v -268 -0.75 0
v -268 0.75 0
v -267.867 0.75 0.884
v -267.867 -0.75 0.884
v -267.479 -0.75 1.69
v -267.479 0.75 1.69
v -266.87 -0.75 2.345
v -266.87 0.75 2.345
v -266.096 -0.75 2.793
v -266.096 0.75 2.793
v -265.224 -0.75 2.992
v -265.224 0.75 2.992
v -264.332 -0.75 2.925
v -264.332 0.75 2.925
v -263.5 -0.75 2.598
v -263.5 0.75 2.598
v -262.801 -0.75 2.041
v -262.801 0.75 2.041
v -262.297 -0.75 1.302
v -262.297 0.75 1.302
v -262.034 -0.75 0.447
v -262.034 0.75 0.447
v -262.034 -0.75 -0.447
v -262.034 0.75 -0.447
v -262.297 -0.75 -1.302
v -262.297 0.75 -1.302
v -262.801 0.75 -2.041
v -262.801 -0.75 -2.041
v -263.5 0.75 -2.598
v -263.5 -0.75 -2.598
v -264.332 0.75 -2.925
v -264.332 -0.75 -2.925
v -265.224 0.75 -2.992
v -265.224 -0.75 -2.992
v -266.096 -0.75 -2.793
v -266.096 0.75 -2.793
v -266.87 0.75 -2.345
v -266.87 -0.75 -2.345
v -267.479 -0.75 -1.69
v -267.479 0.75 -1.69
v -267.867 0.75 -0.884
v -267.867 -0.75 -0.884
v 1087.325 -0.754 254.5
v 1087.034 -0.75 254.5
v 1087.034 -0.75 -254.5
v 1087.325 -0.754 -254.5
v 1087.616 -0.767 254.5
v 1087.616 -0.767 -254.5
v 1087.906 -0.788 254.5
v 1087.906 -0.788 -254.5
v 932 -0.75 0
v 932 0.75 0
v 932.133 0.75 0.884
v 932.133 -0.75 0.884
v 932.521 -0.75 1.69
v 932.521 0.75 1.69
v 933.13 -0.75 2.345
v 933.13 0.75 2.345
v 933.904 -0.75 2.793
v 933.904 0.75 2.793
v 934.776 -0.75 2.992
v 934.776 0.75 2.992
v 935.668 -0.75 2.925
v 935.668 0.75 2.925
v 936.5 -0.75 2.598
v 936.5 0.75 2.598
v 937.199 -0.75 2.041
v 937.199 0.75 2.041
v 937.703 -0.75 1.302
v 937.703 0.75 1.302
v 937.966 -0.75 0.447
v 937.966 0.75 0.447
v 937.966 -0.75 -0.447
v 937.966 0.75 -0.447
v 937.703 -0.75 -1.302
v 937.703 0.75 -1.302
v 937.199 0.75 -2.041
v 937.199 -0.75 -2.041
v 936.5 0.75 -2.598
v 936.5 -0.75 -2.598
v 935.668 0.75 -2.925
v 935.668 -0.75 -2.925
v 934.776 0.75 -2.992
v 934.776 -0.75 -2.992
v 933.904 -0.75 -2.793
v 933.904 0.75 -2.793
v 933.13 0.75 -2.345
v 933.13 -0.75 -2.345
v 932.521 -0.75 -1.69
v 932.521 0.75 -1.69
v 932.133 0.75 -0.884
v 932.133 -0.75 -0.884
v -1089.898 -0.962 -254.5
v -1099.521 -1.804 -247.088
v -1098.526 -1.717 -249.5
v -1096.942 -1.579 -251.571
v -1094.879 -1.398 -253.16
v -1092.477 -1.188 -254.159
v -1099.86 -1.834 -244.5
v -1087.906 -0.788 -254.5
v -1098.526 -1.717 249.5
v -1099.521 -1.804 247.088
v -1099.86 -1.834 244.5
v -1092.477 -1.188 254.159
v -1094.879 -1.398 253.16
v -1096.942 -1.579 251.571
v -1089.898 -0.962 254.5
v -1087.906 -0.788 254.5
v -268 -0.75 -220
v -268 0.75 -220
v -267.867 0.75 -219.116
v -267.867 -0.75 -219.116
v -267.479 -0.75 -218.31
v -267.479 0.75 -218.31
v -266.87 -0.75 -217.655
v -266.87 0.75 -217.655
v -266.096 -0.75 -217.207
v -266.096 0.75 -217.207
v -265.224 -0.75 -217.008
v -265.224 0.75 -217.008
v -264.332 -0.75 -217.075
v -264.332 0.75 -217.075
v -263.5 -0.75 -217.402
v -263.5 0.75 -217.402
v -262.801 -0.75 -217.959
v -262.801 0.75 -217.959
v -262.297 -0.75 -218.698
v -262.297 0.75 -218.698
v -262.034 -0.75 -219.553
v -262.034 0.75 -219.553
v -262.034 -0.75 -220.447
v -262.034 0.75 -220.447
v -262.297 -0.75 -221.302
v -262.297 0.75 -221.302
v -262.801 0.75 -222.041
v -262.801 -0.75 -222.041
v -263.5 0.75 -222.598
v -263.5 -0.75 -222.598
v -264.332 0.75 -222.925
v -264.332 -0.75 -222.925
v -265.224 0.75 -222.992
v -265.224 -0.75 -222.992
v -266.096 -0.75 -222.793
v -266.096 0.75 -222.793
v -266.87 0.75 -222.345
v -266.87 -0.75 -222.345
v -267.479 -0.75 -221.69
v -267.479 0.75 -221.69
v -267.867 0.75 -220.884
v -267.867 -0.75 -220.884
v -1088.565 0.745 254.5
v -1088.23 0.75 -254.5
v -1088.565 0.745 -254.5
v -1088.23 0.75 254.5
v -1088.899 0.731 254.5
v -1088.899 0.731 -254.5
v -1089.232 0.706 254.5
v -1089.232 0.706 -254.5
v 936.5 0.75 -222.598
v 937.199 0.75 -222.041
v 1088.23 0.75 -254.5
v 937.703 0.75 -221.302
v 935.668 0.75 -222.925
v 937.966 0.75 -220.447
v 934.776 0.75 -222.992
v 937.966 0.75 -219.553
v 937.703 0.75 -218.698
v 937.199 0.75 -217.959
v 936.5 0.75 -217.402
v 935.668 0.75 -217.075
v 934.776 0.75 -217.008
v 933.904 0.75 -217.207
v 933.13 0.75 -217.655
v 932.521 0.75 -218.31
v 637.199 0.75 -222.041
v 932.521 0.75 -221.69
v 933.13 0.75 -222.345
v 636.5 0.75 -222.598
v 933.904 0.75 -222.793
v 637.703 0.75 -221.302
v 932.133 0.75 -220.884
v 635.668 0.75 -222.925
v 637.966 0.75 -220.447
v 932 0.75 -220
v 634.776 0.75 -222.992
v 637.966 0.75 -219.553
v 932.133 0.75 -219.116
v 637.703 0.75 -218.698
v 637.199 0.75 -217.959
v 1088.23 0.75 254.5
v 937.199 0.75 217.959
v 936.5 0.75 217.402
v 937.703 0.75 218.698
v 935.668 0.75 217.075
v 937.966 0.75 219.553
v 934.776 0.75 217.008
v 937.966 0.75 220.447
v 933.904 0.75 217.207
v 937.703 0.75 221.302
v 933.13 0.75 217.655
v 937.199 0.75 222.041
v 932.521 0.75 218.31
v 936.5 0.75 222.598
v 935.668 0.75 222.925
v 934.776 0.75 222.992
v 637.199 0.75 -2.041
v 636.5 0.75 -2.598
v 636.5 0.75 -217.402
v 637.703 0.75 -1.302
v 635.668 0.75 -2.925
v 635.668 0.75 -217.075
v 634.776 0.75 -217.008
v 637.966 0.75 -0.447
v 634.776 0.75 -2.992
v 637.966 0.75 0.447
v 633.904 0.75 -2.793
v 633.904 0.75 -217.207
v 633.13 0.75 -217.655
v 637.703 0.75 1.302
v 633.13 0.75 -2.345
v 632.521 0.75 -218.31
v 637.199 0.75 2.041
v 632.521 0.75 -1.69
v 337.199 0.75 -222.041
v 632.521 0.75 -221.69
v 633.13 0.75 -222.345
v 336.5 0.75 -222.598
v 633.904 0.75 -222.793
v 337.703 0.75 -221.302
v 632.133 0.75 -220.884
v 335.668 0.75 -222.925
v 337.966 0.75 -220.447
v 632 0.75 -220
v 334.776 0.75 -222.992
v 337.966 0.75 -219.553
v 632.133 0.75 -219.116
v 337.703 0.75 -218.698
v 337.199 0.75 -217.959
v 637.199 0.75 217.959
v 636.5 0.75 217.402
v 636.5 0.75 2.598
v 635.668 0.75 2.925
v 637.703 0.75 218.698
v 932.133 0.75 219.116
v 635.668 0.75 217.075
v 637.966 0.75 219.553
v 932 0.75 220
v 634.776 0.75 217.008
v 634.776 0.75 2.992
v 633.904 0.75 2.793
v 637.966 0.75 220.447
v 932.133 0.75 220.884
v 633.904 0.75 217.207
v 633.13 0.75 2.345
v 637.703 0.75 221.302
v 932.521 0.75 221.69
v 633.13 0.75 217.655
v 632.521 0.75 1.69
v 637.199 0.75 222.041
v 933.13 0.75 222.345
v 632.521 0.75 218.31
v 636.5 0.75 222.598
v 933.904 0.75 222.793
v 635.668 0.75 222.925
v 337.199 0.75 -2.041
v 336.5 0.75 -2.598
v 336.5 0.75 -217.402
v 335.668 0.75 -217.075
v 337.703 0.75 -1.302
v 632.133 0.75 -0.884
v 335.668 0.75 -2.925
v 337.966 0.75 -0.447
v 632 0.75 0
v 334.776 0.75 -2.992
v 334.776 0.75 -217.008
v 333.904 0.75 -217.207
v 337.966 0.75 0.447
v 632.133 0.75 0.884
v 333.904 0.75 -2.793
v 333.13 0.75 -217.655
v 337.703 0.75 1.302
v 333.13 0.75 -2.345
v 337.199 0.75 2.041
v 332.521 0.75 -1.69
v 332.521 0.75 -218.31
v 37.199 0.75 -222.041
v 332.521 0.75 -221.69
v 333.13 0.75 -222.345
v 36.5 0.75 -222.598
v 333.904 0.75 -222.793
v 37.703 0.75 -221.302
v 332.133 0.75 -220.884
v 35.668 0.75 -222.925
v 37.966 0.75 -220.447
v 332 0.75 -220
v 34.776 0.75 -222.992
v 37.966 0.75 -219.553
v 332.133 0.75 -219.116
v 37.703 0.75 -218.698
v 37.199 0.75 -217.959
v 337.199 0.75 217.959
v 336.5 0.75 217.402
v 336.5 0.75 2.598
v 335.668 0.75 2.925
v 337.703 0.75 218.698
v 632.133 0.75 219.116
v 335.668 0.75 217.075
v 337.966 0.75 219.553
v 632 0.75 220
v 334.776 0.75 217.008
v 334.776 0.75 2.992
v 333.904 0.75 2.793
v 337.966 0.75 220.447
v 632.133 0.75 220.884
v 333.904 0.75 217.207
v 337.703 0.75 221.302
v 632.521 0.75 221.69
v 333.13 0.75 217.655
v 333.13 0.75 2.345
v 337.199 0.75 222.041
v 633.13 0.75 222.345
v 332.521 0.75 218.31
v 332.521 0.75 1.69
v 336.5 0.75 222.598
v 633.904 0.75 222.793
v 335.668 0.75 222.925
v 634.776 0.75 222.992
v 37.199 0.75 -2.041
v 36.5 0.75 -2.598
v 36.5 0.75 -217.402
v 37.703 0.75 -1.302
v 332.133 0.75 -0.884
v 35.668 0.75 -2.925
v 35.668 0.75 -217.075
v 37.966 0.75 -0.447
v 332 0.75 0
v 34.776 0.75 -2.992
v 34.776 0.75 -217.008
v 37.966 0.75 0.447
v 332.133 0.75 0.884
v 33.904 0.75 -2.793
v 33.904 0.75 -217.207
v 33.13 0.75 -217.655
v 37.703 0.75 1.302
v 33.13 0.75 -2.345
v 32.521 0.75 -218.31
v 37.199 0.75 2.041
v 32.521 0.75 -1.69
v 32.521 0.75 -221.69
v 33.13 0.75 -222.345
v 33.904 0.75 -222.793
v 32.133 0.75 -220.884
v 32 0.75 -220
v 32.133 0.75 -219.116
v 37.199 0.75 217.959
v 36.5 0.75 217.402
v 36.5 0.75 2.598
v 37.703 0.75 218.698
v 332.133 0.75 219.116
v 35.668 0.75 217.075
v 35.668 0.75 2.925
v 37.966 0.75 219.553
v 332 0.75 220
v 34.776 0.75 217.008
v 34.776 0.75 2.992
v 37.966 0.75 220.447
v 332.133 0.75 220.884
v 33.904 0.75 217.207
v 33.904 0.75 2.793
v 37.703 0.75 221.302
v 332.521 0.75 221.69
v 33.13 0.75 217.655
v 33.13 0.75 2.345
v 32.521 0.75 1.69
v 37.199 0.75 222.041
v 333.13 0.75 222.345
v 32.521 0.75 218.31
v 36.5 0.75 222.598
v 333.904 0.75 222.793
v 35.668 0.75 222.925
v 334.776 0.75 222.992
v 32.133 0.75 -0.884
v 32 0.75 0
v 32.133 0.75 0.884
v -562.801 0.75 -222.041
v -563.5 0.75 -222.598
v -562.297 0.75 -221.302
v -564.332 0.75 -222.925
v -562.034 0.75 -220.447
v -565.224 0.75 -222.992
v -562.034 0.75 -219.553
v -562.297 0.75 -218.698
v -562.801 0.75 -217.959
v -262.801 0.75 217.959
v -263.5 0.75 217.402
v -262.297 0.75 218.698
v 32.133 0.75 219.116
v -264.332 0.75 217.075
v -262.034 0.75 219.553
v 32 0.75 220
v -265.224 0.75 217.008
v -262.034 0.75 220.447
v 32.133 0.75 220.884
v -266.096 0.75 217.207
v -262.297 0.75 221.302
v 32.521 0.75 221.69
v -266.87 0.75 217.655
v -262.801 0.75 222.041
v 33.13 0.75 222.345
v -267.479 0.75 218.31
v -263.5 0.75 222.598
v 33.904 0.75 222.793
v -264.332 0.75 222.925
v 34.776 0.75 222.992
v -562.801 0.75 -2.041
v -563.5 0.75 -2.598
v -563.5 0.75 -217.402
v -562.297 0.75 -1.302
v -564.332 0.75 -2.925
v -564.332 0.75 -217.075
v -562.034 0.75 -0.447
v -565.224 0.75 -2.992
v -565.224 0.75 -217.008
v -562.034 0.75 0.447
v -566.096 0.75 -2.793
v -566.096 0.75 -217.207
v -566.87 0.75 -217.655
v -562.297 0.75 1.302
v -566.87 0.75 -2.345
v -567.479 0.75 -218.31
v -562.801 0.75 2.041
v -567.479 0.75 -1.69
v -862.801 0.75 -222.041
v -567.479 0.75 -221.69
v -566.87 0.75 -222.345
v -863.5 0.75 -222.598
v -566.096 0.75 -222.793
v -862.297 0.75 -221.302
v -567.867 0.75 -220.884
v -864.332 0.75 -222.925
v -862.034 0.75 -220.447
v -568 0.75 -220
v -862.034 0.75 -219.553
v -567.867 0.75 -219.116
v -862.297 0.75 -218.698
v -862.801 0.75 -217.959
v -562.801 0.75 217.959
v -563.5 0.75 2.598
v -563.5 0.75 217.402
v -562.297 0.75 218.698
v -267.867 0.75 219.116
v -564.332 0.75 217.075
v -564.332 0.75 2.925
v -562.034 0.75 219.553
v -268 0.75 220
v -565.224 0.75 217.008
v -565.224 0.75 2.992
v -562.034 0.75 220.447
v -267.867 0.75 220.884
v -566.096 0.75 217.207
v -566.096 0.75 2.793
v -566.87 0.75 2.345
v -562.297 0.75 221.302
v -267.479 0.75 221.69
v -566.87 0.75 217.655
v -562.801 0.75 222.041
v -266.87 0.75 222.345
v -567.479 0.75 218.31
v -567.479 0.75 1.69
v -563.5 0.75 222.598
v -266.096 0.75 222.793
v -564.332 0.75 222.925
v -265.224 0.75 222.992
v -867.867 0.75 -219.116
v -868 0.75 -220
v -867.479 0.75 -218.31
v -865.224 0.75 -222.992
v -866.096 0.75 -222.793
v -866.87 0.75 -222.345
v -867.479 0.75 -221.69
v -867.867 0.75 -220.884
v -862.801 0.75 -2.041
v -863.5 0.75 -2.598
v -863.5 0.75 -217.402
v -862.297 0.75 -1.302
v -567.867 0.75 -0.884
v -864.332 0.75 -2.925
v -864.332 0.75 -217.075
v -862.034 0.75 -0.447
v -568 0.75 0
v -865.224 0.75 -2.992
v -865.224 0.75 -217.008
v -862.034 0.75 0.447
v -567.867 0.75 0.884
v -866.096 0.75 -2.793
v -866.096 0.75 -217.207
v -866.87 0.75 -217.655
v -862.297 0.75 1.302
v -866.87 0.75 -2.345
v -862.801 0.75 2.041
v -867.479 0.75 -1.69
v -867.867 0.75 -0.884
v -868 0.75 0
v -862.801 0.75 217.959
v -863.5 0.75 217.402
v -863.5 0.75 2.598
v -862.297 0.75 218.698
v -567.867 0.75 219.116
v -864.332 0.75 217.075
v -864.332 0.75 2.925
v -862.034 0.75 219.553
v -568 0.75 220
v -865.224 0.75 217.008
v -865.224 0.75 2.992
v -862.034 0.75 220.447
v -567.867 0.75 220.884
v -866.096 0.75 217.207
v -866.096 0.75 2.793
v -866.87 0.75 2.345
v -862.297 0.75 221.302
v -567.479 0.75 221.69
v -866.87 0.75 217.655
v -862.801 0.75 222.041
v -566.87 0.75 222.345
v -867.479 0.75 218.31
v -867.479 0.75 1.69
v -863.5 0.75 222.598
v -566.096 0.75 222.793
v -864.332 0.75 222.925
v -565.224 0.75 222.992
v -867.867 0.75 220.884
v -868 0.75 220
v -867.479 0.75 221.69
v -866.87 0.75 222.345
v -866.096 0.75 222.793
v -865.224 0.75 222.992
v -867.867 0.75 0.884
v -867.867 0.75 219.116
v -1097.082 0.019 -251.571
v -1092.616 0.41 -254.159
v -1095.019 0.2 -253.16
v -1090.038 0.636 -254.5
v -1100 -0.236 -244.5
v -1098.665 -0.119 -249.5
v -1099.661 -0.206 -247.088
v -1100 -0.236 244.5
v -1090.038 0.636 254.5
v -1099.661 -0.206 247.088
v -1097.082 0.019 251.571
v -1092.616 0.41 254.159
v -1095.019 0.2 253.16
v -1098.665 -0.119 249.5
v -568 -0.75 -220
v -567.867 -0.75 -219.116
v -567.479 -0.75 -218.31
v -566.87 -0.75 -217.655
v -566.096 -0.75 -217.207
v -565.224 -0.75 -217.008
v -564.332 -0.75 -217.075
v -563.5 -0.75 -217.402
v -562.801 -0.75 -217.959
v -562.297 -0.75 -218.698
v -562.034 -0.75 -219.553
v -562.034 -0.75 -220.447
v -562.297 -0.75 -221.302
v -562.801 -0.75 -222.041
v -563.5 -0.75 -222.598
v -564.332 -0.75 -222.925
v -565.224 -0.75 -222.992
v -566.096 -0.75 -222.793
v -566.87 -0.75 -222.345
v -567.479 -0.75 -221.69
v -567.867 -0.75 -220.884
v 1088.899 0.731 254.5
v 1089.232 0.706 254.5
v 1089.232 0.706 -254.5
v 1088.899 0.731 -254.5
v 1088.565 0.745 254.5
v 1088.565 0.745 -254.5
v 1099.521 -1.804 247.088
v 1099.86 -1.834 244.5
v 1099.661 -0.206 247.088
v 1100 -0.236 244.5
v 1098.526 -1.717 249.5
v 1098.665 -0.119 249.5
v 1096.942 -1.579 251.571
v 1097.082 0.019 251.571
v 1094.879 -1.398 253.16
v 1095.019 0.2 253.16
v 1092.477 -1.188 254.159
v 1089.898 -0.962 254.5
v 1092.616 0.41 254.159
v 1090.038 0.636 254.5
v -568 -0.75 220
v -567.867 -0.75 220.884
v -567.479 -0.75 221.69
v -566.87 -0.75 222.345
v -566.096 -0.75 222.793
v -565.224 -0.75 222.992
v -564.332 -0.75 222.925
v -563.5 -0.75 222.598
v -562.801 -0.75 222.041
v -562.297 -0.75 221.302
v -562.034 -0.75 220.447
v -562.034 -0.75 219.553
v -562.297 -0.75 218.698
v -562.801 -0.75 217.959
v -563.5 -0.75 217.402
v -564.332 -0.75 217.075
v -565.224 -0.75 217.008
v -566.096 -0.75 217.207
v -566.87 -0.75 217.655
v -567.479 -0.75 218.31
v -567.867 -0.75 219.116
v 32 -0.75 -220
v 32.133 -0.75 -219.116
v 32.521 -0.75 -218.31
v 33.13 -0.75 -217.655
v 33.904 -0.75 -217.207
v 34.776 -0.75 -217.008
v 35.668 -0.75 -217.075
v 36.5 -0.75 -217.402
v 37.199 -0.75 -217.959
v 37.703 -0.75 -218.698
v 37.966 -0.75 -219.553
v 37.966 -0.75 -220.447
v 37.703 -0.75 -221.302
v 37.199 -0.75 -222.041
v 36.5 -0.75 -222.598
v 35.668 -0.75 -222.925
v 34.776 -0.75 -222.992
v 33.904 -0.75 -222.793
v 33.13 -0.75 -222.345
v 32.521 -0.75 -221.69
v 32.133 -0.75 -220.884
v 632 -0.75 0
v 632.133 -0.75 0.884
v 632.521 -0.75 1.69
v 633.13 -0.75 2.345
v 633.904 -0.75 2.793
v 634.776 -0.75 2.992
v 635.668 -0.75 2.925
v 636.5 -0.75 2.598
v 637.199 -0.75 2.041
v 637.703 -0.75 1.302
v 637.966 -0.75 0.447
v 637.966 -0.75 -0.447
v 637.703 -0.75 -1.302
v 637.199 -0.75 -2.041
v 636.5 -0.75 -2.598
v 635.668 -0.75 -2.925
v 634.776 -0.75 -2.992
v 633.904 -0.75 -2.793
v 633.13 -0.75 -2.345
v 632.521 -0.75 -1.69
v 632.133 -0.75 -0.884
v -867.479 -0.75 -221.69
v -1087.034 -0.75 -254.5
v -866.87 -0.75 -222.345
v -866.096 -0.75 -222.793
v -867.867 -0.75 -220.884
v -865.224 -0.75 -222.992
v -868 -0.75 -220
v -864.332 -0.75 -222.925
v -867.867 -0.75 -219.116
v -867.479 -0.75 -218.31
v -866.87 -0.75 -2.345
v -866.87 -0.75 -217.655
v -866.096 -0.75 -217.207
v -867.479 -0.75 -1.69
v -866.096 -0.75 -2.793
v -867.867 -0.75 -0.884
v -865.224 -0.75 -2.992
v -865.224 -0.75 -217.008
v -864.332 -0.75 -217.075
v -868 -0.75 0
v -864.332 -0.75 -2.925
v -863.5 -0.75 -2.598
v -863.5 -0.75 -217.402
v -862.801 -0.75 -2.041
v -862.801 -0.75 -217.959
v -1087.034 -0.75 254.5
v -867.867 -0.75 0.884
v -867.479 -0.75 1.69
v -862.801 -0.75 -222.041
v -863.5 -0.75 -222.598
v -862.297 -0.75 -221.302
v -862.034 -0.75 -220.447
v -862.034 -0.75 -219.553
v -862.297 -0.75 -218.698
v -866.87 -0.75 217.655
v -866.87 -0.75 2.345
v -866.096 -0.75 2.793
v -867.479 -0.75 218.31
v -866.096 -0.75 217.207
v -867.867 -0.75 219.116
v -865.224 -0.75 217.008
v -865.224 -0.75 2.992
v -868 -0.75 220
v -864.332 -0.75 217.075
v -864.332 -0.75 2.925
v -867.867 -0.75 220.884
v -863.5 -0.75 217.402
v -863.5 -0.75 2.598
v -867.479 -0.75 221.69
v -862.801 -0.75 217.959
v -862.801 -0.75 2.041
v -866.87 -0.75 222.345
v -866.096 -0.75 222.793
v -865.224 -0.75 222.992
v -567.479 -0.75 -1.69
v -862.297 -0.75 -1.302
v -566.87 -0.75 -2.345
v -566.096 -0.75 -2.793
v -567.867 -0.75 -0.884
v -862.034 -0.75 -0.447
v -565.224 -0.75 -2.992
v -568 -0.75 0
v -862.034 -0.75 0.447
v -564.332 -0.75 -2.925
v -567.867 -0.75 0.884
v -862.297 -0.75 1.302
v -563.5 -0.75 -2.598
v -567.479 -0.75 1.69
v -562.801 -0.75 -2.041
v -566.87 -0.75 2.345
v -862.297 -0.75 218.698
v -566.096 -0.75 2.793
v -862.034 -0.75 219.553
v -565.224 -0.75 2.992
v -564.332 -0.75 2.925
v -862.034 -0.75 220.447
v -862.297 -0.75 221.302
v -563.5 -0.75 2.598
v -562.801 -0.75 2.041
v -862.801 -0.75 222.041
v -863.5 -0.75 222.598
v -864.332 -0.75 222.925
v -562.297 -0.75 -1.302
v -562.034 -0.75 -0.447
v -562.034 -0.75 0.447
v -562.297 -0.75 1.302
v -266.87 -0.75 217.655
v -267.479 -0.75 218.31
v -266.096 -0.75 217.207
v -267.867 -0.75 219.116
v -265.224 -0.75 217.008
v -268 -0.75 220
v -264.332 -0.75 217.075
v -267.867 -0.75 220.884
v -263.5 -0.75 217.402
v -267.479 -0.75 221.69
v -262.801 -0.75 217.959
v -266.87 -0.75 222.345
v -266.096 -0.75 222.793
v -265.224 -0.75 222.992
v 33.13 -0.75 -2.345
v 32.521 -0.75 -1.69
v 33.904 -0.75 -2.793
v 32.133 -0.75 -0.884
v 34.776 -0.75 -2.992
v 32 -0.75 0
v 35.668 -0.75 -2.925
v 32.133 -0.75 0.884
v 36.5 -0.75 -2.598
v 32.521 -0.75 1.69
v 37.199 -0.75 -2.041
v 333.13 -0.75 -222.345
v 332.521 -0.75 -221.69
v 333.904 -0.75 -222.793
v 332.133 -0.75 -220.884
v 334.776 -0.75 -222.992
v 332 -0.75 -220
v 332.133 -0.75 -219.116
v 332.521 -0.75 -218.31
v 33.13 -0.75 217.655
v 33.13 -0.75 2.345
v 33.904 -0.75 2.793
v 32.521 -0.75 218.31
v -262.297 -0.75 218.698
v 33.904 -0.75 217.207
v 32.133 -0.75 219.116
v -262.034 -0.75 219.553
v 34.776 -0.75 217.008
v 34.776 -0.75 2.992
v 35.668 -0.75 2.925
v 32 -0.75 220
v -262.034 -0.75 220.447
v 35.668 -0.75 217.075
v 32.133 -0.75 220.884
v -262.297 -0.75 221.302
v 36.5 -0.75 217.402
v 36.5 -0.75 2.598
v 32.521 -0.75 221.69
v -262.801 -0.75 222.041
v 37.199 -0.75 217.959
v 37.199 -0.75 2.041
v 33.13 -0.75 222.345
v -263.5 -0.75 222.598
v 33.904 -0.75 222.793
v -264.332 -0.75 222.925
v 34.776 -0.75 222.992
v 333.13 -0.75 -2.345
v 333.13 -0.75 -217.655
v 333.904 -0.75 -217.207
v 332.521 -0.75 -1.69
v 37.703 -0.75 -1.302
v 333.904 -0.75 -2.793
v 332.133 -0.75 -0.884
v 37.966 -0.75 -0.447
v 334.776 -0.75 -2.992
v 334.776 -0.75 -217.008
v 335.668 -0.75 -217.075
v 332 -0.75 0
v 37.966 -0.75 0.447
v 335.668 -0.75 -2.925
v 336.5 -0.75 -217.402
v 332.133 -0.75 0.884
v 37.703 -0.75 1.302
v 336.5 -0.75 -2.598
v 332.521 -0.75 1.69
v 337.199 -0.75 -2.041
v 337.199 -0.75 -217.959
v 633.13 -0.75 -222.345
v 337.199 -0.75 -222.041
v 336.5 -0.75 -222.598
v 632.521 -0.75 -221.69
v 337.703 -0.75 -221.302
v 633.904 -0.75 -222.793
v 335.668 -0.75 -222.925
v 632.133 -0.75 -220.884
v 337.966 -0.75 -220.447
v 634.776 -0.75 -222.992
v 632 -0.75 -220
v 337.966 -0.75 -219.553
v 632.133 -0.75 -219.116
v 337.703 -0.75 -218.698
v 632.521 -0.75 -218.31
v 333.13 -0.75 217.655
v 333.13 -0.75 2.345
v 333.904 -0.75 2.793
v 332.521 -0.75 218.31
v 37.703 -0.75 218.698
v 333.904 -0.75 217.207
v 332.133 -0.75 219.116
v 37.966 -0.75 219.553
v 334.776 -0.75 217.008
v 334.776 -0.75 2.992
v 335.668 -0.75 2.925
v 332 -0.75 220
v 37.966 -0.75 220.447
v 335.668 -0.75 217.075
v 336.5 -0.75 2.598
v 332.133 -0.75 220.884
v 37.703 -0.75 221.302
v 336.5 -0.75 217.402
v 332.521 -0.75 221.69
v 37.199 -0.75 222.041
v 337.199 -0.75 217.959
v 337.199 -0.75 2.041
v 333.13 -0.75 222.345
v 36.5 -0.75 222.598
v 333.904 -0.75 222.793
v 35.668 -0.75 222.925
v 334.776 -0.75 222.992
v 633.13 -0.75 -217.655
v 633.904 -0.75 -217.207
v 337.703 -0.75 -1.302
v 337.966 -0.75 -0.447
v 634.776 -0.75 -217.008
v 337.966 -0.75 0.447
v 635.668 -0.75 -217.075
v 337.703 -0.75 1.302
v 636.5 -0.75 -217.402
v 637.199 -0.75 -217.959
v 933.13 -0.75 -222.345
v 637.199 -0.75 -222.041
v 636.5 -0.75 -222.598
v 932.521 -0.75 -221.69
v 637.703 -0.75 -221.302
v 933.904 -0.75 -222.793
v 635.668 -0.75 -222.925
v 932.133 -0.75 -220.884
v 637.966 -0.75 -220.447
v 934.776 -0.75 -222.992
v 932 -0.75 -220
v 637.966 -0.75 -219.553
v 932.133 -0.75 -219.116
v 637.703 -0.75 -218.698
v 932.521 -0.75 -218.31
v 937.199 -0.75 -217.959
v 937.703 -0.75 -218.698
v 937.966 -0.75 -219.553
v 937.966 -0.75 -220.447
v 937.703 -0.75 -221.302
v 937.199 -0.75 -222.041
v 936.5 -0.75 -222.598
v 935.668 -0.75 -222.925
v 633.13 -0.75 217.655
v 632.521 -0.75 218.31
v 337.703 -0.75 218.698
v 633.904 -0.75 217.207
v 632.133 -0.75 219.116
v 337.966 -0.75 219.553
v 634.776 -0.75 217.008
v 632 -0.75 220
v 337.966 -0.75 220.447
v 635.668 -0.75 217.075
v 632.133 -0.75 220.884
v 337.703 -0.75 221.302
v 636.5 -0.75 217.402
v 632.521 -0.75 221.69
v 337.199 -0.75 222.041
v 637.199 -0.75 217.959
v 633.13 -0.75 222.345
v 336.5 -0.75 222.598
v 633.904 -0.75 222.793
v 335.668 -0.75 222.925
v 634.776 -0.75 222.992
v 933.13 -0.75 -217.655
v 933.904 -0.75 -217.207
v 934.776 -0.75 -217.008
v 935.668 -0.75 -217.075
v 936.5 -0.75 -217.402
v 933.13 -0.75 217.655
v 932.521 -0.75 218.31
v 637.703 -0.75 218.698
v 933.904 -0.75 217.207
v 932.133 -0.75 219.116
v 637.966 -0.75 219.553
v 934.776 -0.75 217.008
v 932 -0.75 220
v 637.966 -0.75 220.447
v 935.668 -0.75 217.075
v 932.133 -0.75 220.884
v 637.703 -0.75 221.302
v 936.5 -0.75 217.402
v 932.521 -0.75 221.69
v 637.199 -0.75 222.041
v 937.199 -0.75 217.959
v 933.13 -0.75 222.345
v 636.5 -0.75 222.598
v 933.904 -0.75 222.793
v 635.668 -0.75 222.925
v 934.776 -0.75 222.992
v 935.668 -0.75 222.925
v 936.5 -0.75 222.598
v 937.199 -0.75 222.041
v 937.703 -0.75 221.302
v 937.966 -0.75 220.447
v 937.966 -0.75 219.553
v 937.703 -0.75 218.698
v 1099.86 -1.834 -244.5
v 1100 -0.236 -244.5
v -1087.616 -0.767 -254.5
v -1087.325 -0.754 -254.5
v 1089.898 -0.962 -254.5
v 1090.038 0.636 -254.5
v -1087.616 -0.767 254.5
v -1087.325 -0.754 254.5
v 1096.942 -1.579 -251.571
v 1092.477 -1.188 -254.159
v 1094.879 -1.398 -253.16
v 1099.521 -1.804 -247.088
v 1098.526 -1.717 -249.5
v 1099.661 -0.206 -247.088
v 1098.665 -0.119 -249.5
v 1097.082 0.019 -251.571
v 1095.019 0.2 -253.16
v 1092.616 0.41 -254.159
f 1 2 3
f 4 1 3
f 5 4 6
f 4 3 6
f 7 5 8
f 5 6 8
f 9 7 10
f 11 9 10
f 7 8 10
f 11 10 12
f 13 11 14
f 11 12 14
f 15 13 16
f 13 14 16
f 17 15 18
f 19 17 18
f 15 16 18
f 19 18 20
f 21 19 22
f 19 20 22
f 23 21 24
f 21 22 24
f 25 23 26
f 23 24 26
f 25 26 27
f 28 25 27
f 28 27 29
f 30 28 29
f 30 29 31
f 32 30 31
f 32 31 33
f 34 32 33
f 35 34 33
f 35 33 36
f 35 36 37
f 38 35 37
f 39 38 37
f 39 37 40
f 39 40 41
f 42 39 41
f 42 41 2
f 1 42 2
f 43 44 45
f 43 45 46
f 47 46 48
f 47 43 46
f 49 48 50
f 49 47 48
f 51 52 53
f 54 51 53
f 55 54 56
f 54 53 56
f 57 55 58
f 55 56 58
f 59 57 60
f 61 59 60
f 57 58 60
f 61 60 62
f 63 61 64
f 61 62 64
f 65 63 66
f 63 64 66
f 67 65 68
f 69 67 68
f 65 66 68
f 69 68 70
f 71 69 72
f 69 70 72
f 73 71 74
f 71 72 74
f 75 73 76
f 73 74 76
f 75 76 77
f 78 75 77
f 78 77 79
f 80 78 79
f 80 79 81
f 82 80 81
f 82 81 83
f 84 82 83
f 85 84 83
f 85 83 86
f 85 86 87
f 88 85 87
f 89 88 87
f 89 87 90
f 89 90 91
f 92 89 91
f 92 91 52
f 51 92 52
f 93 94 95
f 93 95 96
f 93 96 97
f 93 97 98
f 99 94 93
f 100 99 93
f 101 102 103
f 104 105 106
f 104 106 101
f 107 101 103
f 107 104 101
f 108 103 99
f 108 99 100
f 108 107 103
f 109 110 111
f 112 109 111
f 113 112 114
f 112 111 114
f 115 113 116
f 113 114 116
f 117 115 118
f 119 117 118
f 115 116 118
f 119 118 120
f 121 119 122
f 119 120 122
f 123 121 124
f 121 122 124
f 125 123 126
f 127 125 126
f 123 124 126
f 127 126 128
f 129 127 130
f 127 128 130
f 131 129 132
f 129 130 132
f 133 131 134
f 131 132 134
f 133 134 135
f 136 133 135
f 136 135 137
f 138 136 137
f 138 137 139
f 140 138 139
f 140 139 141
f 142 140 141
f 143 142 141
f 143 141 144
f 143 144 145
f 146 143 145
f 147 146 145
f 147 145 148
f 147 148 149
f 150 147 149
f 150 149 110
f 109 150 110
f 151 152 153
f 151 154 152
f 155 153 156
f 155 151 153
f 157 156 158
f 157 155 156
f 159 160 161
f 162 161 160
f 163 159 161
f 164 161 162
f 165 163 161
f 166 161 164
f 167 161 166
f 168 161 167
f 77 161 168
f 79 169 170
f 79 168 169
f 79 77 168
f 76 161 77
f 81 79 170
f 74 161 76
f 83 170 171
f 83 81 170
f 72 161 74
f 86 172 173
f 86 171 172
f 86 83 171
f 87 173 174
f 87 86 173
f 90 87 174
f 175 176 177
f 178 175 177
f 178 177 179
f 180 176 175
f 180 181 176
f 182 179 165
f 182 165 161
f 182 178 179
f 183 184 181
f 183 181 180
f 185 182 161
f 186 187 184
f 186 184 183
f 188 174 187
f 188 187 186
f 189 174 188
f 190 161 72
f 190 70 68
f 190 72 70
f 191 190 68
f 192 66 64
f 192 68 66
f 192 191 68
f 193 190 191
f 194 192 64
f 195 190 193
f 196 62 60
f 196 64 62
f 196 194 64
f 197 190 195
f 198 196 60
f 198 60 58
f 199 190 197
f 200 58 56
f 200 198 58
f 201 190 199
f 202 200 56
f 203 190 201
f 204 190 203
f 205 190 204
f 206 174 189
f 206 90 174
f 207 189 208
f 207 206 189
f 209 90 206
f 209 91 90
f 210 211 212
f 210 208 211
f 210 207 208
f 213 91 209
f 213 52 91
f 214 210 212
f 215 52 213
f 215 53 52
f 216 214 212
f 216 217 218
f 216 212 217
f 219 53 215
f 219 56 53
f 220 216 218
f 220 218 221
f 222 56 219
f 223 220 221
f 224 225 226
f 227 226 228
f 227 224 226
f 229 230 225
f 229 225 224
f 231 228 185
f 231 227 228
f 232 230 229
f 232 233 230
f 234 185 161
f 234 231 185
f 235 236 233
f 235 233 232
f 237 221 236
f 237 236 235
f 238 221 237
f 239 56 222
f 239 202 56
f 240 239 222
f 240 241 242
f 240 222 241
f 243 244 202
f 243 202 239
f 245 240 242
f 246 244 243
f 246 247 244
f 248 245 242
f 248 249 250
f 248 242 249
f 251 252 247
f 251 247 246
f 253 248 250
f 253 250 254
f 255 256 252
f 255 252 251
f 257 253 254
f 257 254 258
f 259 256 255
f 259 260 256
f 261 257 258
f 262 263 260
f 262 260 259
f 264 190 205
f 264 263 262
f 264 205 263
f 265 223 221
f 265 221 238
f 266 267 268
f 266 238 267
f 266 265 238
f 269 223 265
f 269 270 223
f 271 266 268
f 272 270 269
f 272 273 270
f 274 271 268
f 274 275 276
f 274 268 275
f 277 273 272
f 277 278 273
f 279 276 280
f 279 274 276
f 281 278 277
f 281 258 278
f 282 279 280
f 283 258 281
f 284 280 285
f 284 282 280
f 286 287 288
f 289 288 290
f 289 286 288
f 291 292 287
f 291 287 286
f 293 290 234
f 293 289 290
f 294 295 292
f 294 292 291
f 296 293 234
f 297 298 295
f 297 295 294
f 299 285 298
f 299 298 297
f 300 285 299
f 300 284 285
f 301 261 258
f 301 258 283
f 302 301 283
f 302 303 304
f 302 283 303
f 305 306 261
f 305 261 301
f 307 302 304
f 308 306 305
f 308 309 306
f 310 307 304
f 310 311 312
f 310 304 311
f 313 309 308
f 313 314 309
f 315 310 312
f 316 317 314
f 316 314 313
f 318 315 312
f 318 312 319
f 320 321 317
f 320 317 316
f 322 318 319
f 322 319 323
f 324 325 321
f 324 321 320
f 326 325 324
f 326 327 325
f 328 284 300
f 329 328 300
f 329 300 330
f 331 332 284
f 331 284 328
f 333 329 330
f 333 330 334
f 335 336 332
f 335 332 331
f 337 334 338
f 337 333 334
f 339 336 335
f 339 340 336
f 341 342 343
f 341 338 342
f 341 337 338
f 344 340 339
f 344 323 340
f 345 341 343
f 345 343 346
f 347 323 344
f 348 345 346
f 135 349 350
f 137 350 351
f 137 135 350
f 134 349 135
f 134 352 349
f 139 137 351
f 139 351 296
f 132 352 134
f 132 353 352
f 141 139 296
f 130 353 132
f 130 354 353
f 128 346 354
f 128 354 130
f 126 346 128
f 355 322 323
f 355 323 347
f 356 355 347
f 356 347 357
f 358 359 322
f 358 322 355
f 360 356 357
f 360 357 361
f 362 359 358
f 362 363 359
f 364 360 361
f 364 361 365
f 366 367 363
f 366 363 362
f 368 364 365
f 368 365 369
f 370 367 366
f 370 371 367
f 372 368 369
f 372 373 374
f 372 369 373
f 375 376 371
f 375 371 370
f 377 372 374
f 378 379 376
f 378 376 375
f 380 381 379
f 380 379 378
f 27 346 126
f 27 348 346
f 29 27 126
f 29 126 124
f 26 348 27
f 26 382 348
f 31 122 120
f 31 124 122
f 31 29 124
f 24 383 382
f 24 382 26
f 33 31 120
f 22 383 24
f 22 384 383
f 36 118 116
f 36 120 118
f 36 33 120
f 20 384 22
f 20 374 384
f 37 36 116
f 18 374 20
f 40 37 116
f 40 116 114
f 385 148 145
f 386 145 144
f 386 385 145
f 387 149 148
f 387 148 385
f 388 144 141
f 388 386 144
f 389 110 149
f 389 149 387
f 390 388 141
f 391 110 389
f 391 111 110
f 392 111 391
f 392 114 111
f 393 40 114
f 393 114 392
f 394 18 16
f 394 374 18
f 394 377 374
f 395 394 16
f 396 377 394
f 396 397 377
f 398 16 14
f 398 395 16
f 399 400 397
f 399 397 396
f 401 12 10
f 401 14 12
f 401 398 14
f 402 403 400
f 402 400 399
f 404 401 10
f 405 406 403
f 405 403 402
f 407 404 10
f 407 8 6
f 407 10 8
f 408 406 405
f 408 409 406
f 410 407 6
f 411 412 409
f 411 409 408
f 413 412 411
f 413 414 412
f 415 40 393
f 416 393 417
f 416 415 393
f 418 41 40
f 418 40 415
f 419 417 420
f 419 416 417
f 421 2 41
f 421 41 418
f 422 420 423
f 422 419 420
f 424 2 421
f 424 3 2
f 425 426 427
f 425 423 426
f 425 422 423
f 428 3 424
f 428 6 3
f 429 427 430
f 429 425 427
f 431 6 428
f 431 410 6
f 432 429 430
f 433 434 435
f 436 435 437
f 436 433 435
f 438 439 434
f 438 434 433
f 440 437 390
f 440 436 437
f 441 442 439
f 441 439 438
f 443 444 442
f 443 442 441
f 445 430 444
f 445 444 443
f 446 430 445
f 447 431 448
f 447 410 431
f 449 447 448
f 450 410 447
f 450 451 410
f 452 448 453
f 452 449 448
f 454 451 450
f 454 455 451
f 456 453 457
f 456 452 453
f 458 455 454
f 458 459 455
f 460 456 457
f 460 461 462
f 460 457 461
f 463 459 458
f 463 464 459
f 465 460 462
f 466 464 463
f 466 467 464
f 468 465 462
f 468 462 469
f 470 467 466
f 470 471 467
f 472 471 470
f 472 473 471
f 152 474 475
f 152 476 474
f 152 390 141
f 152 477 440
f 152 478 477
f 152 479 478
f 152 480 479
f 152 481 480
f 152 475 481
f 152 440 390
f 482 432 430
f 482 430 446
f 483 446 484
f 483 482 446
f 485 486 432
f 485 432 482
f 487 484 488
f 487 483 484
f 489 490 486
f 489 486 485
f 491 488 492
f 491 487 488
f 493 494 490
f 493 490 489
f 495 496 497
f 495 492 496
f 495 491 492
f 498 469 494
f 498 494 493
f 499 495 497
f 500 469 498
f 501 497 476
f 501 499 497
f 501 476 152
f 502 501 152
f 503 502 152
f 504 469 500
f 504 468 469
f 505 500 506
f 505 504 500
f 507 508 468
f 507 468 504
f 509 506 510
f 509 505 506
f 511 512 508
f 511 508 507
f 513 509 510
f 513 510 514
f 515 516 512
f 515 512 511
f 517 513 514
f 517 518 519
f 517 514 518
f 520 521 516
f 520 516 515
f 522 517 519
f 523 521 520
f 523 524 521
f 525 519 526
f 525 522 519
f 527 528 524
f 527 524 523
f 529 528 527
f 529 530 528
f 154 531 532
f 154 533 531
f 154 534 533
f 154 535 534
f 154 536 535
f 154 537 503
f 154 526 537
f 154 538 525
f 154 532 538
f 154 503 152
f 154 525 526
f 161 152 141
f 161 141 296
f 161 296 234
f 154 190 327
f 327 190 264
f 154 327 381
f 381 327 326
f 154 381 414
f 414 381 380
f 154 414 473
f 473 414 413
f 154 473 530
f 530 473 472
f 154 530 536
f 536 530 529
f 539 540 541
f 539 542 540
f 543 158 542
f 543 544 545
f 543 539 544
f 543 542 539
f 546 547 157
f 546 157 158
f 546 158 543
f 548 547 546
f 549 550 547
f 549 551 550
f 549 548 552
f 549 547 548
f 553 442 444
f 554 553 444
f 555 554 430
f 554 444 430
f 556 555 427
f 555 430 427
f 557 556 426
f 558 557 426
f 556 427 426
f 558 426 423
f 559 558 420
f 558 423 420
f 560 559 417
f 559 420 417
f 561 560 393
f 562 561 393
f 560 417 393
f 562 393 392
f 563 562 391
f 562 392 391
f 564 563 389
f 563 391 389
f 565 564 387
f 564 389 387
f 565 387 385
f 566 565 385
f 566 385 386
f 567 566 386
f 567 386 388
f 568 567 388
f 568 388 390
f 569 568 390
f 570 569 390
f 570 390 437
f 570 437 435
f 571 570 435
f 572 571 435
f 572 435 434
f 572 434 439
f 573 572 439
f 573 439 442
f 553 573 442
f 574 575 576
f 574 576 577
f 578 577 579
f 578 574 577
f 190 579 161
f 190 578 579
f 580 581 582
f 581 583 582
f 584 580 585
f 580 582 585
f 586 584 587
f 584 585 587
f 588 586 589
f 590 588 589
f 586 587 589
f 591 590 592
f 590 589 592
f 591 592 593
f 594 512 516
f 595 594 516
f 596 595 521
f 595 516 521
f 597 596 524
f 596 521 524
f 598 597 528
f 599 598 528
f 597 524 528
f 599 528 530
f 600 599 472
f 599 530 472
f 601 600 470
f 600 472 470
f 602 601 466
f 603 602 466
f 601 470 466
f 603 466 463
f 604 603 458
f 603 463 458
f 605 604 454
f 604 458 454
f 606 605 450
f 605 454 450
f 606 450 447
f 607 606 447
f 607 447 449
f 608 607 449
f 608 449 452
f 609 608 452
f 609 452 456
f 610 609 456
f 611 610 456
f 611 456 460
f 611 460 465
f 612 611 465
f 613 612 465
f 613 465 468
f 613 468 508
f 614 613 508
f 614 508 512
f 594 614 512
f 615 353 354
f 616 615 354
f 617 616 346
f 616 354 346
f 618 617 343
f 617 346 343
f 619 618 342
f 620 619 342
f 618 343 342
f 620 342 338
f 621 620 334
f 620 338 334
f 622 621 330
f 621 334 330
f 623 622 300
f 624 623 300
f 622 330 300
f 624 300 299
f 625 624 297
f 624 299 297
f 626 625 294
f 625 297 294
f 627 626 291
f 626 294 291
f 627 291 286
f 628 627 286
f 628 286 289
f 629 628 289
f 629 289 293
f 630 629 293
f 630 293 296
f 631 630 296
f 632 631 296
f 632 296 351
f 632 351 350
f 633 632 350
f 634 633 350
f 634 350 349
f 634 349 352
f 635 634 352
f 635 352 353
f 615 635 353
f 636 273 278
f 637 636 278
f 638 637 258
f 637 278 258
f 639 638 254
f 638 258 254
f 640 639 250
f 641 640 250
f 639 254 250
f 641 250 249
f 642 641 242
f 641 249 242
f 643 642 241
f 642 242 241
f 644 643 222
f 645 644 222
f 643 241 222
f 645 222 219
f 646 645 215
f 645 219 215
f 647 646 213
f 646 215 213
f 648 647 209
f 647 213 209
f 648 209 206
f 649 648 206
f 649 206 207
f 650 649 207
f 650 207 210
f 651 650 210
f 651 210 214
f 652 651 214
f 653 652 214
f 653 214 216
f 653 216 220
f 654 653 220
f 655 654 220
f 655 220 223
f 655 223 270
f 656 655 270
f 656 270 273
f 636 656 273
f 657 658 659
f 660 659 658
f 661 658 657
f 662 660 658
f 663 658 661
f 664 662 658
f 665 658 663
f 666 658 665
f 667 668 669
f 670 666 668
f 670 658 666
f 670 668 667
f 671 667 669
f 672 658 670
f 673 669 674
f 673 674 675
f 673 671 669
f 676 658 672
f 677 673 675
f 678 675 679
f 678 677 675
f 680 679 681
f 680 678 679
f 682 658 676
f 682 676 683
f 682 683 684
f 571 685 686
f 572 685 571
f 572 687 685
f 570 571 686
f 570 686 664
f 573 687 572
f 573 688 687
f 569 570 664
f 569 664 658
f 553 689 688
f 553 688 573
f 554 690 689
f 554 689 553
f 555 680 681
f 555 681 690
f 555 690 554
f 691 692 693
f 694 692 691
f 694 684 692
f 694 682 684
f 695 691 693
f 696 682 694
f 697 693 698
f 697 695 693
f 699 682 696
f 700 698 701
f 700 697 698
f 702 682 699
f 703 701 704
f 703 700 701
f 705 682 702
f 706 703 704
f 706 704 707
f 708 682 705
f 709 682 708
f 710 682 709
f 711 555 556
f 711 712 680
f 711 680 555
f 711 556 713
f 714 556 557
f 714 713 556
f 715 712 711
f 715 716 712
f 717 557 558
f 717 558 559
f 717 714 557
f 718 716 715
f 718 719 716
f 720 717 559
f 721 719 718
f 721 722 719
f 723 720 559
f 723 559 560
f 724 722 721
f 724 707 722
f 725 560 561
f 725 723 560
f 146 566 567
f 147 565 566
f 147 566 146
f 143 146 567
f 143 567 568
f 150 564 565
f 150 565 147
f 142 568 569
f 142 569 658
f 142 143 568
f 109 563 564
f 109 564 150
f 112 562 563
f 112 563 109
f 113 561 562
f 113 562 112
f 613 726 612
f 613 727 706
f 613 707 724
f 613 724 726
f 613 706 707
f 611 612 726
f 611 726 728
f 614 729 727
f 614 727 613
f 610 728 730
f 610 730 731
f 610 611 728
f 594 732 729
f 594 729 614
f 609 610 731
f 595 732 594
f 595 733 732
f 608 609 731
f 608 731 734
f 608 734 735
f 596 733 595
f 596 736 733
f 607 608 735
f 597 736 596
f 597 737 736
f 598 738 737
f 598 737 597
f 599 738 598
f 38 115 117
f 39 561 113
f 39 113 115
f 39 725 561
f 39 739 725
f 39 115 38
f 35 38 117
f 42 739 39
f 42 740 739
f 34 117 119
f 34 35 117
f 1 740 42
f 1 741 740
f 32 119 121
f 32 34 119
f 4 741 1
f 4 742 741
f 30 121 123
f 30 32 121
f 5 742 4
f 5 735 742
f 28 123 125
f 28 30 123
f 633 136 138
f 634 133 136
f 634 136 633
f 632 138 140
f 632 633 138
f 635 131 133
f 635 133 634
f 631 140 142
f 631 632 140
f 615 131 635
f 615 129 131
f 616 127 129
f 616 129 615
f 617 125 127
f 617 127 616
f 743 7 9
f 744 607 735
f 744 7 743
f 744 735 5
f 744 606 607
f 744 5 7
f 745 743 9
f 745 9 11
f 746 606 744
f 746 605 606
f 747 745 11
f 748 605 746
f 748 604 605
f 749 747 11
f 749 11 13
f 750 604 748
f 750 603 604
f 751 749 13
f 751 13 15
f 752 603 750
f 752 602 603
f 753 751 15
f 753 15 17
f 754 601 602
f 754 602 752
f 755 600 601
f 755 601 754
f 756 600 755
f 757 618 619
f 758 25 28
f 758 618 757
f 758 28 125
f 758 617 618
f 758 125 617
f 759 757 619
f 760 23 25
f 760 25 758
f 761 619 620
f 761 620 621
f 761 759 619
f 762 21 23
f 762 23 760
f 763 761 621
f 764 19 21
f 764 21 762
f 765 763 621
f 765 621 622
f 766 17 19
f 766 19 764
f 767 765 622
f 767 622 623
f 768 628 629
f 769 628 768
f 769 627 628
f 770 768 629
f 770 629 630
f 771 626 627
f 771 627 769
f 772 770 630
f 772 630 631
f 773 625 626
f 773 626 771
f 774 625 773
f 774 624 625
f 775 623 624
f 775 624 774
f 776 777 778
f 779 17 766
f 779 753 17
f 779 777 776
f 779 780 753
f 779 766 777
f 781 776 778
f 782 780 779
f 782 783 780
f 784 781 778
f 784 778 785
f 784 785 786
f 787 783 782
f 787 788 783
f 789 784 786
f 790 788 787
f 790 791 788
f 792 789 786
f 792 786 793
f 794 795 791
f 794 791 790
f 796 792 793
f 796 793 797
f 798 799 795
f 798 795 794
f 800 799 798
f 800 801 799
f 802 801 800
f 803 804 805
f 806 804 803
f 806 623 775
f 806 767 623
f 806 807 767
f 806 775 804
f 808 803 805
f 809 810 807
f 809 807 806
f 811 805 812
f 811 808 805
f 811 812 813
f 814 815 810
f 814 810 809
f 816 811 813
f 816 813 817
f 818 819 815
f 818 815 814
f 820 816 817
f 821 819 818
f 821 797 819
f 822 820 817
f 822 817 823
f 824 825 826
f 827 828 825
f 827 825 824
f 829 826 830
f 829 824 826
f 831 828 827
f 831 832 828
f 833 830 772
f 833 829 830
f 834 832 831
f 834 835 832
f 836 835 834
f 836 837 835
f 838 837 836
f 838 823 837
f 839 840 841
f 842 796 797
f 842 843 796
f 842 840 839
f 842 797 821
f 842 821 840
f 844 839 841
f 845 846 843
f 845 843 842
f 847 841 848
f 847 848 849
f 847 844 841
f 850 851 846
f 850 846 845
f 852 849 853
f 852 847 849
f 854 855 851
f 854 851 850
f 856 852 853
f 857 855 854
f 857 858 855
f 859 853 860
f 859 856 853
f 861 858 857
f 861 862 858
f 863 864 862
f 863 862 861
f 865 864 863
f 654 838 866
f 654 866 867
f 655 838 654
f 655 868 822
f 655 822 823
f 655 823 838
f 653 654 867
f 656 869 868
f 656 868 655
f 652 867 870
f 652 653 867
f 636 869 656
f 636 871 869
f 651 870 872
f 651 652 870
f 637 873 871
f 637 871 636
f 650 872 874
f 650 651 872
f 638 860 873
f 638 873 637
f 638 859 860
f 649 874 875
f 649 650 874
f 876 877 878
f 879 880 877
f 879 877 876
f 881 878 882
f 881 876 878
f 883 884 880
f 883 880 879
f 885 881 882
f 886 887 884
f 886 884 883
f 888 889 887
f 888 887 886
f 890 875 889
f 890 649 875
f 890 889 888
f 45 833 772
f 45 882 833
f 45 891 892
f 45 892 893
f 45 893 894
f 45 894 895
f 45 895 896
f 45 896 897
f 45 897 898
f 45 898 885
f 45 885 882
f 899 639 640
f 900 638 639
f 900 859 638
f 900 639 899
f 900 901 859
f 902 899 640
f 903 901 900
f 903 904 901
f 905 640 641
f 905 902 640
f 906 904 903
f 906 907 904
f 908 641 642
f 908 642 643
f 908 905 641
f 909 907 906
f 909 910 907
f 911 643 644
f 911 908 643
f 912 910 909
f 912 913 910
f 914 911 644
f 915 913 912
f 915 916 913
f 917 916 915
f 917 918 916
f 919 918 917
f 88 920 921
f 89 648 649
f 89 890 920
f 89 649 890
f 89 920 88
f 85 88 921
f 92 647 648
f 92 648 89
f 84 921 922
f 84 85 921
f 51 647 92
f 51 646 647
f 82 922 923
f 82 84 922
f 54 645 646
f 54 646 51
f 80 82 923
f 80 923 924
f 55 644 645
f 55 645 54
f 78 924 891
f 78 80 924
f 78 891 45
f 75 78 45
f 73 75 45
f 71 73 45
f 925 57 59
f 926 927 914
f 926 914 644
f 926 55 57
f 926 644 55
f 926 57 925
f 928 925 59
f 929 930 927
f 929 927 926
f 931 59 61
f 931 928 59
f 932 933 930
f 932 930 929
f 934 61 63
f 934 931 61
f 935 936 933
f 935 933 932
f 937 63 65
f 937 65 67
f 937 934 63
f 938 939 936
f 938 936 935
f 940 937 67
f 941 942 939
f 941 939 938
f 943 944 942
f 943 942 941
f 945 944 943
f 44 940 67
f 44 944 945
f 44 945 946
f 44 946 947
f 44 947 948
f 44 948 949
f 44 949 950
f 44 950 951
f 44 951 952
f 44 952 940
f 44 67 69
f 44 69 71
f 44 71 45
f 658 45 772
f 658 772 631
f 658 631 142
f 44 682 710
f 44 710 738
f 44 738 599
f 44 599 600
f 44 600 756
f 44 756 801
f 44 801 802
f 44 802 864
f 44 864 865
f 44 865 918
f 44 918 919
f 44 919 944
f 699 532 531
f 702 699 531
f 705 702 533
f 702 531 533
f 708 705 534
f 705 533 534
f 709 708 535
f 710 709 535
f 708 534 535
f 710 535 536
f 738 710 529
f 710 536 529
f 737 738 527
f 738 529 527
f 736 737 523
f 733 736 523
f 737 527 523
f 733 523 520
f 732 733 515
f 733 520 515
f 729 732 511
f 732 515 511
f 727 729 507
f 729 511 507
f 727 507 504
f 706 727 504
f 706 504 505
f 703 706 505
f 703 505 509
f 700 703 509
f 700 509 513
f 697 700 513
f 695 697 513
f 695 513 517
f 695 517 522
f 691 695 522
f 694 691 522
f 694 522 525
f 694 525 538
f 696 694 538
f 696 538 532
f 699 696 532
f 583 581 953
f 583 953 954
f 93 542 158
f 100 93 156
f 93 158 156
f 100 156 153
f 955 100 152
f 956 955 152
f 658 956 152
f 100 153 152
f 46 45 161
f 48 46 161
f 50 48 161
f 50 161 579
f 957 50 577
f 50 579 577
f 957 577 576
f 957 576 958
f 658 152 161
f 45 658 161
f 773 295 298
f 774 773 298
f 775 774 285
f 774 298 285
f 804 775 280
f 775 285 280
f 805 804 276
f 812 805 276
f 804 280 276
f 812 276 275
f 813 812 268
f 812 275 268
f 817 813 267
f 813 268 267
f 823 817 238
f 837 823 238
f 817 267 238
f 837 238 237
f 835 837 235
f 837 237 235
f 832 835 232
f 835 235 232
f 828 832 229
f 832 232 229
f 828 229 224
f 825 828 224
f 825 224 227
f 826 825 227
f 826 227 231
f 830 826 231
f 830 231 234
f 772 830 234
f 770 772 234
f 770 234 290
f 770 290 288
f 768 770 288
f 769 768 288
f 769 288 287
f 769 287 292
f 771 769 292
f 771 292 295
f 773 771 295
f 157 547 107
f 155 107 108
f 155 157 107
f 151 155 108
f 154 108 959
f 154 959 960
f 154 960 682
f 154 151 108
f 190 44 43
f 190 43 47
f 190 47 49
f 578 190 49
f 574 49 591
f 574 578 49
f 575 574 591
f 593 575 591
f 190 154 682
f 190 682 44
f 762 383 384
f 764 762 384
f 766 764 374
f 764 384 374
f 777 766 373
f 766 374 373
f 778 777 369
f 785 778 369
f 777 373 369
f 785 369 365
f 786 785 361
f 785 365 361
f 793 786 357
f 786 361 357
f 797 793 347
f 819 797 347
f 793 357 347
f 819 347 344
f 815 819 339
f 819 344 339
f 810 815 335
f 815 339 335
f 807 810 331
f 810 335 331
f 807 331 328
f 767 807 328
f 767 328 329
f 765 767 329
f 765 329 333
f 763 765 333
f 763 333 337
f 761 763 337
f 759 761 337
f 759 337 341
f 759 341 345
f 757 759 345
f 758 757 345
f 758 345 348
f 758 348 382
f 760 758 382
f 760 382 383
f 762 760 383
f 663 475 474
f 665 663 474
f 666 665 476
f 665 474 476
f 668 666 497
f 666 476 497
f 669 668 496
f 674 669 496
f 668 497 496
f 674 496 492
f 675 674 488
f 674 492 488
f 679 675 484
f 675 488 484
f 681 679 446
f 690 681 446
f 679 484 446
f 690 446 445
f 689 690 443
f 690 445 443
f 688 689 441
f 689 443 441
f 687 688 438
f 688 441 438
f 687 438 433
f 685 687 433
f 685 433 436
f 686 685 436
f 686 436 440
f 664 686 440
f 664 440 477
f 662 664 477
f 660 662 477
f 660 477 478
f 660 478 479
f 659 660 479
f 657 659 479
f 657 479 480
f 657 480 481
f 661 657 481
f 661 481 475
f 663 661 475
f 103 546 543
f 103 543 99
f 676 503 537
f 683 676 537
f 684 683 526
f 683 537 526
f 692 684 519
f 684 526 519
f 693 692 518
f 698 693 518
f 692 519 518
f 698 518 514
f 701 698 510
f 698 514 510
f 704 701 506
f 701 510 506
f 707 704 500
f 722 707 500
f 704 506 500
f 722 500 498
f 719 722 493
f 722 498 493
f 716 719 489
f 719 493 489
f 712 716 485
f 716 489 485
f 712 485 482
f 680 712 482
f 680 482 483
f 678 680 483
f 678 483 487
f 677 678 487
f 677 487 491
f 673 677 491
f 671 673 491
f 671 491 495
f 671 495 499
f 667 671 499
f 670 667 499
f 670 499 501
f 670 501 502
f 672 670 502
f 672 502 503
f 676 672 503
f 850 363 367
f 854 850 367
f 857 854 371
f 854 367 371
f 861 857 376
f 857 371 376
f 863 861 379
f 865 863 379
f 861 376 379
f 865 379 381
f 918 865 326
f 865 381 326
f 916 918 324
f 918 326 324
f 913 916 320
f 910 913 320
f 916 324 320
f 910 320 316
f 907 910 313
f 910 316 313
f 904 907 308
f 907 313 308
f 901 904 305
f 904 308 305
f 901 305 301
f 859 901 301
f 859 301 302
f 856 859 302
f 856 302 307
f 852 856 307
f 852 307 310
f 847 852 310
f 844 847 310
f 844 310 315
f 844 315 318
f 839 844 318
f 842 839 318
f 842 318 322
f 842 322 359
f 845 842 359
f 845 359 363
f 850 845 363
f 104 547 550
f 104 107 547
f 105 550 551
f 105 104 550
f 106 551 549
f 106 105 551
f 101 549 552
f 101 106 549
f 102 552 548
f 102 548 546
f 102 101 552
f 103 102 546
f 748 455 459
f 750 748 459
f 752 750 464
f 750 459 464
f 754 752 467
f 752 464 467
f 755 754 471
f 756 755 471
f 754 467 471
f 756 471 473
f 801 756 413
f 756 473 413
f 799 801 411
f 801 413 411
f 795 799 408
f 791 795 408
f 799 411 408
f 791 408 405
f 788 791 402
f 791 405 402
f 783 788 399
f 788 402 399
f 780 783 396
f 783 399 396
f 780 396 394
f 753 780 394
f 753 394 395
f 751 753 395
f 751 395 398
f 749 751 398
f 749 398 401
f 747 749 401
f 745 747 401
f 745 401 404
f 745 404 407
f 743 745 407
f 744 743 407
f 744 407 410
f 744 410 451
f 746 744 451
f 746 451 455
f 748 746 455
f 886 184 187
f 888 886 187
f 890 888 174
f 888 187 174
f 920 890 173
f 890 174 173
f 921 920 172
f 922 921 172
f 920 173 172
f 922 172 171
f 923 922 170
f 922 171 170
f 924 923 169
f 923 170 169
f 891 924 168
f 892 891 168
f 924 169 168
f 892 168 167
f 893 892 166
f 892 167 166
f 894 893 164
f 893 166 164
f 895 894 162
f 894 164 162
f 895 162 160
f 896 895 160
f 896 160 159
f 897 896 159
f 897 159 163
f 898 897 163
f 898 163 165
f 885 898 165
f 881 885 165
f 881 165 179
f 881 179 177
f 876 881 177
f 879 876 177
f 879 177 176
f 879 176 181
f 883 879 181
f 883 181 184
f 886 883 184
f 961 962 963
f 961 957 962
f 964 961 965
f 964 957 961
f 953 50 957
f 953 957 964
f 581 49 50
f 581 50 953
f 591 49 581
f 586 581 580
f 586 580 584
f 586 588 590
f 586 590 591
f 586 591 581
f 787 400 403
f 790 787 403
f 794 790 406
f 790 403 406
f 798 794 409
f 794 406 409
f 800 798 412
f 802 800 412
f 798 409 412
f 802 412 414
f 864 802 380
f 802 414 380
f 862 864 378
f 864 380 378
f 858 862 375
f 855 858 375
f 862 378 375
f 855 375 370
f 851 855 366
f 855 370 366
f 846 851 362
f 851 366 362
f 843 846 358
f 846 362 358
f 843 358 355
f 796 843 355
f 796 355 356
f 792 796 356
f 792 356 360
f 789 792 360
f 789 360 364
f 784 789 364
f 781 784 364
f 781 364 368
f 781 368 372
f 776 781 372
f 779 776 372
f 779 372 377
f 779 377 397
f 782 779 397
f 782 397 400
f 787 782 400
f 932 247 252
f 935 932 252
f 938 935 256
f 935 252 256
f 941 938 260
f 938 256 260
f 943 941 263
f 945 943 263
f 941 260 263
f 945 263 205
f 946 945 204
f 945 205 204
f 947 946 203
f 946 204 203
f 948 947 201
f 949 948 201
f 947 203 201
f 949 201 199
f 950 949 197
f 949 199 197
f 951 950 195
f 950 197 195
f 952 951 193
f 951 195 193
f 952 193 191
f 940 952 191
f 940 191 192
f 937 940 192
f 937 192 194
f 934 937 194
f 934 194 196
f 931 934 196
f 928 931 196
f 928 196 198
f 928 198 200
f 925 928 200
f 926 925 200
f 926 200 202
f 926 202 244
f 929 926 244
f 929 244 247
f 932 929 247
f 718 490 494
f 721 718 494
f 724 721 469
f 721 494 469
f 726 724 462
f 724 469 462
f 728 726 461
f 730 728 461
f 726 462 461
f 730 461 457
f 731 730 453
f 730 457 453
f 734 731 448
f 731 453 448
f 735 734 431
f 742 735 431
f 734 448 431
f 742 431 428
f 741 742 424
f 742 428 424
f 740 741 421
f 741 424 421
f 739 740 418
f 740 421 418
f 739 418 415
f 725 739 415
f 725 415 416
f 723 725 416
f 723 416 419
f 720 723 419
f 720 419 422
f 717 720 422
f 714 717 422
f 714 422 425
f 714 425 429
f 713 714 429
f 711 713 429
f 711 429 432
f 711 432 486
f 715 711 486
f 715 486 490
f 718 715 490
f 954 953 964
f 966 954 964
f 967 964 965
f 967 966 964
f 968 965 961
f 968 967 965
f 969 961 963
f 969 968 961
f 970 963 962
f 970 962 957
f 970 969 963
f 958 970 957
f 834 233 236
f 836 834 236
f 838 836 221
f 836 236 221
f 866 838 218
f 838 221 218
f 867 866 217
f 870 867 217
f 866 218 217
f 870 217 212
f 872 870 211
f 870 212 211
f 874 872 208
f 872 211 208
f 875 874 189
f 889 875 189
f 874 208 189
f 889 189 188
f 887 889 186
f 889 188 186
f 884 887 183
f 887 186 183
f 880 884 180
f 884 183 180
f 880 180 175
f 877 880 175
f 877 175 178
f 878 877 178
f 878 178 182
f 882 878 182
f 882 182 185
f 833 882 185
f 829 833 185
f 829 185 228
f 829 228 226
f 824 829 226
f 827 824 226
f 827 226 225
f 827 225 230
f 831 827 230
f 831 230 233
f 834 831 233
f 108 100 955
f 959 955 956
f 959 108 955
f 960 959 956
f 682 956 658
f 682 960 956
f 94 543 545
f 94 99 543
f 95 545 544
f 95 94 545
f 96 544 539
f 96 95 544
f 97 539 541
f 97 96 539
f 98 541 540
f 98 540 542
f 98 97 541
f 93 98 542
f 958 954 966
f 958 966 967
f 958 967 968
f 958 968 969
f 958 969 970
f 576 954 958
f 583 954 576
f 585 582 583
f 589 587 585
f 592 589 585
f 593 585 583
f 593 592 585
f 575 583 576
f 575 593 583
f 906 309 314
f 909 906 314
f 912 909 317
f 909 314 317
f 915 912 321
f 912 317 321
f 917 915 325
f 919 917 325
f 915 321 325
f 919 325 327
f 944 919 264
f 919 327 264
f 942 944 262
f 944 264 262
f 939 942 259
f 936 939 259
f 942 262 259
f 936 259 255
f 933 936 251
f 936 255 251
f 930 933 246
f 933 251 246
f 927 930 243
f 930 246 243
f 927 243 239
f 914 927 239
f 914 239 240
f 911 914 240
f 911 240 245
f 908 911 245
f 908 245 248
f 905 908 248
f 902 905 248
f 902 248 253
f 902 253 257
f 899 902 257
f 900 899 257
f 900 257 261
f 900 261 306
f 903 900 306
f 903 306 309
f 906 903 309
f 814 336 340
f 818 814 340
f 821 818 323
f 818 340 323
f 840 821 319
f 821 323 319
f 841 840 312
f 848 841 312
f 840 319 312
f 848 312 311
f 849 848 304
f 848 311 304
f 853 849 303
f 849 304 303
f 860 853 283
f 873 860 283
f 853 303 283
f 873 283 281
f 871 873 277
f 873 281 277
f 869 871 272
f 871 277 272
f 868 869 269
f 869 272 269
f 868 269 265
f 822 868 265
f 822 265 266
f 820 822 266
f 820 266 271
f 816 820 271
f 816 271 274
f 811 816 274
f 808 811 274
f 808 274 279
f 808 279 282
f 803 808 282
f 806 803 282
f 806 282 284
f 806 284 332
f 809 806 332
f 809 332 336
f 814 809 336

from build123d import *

# Parameters (mm, degrees)
ESTRUSIONE_ESTRUSIONE1_DEPTH = 254.5
RACCORDO1_R                  = 10
SCHIZZO2_R                   = 3
TAGLIO_ESTRUSIONE1_DEPTH     = 2
RIPETIZIONE_A_L1_COUNT       = 4
RIPETIZIONE_A_L1_PITCH       = 300
RIPETIZIONE_A_L1_COL_COUNT   = 4
RIPETIZIONE_A_L1_COL_PITCH   = 300


with BuildPart() as part:
    # Schizzo1 → Estrusione-Estrusione1 (new, symmetric)
    with BuildSketch(Plane.XY):
        with BuildLine():
            Line((-1089.232382107, 0.706239028), (-1100, -0.235805471))
            Line((-1100, -0.235805471), (-1099.860182927, -1.833921932))
            Line((-1099.860182927, -1.833921932), (-1087.90584655, -0.788053019))
            ThreePointArc((-1087.90584655, -0.788053019), (-1087.470482996, -0.759517784), (-1087.034289122, -0.75))
            Line((-1087.034289122, -0.75), (1087.034289122, -0.75))
            ThreePointArc((1087.034289122, -0.75), (1087.470482996, -0.759517784), (1087.90584655, -0.788053019))
            Line((1087.90584655, -0.788053019), (1099.860182927, -1.833921932))
            Line((1099.860182927, -1.833921932), (1100, -0.235805471))
            Line((1100, -0.235805471), (1089.232382107, 0.706239028))
            ThreePointArc((1089.232382107, 0.706239028), (1088.73171402, 0.739054548), (1088.230091065, 0.75))
            Line((1088.230091065, 0.75), (-1088.230091065, 0.75))
            ThreePointArc((-1088.230091065, 0.75), (-1088.73171402, 0.739054548), (-1089.232382107, 0.706239028))
        make_face()
    extrude(amount=ESTRUSIONE_ESTRUSIONE1_DEPTH, both=True)

    # Raccordo1
    raccordo1_edges = [part.edges().sort_by_distance(p)[0] for p in [
        (1099.930091463, -1.034863701, -254.5),
        (-1099.930091463, -1.034863701, -254.5),
        (1099.930091463, -1.034863701, 254.5),
        (-1099.930091463, -1.034863701, 254.5),
    ]]
    fillet(raccordo1_edges, radius=RACCORDO1_R)

    # Schizzo2 → Taglio-Estrusione1 (cut)
    with BuildSketch(Plane(origin=(0, 0.75, 0), x_dir=(1, 0, 0), z_dir=(0, 1, 0))):
        with Locations(Location((35, -220, 0), (0, 0, 180))):
            Circle(SCHIZZO2_R)
        with Locations(Location((35, 220, 0), (0, 0, 180))):
            Circle(SCHIZZO2_R)
        with Locations(Location((35, 0, 0), (0, 0, 180))):
            Circle(SCHIZZO2_R)
    taglio_estrusione1 = extrude(amount=-TAGLIO_ESTRUSIONE1_DEPTH, mode=Mode.SUBTRACT)

    # Ripetizione a L1: Taglio-Estrusione1 ×4
    with Locations(*[(i * RIPETIZIONE_A_L1_PITCH, 0, 0) for i in range(1, RIPETIZIONE_A_L1_COUNT)]):
        add(taglio_estrusione1, mode=Mode.SUBTRACT)

    # Ripetizione a L1 col: Taglio-Estrusione1 ×4
    with Locations(*[(-i * RIPETIZIONE_A_L1_COL_PITCH, 0, 0) for i in range(1, RIPETIZIONE_A_L1_COL_COUNT)]):
        add(taglio_estrusione1, mode=Mode.SUBTRACT)


solid = part.part
